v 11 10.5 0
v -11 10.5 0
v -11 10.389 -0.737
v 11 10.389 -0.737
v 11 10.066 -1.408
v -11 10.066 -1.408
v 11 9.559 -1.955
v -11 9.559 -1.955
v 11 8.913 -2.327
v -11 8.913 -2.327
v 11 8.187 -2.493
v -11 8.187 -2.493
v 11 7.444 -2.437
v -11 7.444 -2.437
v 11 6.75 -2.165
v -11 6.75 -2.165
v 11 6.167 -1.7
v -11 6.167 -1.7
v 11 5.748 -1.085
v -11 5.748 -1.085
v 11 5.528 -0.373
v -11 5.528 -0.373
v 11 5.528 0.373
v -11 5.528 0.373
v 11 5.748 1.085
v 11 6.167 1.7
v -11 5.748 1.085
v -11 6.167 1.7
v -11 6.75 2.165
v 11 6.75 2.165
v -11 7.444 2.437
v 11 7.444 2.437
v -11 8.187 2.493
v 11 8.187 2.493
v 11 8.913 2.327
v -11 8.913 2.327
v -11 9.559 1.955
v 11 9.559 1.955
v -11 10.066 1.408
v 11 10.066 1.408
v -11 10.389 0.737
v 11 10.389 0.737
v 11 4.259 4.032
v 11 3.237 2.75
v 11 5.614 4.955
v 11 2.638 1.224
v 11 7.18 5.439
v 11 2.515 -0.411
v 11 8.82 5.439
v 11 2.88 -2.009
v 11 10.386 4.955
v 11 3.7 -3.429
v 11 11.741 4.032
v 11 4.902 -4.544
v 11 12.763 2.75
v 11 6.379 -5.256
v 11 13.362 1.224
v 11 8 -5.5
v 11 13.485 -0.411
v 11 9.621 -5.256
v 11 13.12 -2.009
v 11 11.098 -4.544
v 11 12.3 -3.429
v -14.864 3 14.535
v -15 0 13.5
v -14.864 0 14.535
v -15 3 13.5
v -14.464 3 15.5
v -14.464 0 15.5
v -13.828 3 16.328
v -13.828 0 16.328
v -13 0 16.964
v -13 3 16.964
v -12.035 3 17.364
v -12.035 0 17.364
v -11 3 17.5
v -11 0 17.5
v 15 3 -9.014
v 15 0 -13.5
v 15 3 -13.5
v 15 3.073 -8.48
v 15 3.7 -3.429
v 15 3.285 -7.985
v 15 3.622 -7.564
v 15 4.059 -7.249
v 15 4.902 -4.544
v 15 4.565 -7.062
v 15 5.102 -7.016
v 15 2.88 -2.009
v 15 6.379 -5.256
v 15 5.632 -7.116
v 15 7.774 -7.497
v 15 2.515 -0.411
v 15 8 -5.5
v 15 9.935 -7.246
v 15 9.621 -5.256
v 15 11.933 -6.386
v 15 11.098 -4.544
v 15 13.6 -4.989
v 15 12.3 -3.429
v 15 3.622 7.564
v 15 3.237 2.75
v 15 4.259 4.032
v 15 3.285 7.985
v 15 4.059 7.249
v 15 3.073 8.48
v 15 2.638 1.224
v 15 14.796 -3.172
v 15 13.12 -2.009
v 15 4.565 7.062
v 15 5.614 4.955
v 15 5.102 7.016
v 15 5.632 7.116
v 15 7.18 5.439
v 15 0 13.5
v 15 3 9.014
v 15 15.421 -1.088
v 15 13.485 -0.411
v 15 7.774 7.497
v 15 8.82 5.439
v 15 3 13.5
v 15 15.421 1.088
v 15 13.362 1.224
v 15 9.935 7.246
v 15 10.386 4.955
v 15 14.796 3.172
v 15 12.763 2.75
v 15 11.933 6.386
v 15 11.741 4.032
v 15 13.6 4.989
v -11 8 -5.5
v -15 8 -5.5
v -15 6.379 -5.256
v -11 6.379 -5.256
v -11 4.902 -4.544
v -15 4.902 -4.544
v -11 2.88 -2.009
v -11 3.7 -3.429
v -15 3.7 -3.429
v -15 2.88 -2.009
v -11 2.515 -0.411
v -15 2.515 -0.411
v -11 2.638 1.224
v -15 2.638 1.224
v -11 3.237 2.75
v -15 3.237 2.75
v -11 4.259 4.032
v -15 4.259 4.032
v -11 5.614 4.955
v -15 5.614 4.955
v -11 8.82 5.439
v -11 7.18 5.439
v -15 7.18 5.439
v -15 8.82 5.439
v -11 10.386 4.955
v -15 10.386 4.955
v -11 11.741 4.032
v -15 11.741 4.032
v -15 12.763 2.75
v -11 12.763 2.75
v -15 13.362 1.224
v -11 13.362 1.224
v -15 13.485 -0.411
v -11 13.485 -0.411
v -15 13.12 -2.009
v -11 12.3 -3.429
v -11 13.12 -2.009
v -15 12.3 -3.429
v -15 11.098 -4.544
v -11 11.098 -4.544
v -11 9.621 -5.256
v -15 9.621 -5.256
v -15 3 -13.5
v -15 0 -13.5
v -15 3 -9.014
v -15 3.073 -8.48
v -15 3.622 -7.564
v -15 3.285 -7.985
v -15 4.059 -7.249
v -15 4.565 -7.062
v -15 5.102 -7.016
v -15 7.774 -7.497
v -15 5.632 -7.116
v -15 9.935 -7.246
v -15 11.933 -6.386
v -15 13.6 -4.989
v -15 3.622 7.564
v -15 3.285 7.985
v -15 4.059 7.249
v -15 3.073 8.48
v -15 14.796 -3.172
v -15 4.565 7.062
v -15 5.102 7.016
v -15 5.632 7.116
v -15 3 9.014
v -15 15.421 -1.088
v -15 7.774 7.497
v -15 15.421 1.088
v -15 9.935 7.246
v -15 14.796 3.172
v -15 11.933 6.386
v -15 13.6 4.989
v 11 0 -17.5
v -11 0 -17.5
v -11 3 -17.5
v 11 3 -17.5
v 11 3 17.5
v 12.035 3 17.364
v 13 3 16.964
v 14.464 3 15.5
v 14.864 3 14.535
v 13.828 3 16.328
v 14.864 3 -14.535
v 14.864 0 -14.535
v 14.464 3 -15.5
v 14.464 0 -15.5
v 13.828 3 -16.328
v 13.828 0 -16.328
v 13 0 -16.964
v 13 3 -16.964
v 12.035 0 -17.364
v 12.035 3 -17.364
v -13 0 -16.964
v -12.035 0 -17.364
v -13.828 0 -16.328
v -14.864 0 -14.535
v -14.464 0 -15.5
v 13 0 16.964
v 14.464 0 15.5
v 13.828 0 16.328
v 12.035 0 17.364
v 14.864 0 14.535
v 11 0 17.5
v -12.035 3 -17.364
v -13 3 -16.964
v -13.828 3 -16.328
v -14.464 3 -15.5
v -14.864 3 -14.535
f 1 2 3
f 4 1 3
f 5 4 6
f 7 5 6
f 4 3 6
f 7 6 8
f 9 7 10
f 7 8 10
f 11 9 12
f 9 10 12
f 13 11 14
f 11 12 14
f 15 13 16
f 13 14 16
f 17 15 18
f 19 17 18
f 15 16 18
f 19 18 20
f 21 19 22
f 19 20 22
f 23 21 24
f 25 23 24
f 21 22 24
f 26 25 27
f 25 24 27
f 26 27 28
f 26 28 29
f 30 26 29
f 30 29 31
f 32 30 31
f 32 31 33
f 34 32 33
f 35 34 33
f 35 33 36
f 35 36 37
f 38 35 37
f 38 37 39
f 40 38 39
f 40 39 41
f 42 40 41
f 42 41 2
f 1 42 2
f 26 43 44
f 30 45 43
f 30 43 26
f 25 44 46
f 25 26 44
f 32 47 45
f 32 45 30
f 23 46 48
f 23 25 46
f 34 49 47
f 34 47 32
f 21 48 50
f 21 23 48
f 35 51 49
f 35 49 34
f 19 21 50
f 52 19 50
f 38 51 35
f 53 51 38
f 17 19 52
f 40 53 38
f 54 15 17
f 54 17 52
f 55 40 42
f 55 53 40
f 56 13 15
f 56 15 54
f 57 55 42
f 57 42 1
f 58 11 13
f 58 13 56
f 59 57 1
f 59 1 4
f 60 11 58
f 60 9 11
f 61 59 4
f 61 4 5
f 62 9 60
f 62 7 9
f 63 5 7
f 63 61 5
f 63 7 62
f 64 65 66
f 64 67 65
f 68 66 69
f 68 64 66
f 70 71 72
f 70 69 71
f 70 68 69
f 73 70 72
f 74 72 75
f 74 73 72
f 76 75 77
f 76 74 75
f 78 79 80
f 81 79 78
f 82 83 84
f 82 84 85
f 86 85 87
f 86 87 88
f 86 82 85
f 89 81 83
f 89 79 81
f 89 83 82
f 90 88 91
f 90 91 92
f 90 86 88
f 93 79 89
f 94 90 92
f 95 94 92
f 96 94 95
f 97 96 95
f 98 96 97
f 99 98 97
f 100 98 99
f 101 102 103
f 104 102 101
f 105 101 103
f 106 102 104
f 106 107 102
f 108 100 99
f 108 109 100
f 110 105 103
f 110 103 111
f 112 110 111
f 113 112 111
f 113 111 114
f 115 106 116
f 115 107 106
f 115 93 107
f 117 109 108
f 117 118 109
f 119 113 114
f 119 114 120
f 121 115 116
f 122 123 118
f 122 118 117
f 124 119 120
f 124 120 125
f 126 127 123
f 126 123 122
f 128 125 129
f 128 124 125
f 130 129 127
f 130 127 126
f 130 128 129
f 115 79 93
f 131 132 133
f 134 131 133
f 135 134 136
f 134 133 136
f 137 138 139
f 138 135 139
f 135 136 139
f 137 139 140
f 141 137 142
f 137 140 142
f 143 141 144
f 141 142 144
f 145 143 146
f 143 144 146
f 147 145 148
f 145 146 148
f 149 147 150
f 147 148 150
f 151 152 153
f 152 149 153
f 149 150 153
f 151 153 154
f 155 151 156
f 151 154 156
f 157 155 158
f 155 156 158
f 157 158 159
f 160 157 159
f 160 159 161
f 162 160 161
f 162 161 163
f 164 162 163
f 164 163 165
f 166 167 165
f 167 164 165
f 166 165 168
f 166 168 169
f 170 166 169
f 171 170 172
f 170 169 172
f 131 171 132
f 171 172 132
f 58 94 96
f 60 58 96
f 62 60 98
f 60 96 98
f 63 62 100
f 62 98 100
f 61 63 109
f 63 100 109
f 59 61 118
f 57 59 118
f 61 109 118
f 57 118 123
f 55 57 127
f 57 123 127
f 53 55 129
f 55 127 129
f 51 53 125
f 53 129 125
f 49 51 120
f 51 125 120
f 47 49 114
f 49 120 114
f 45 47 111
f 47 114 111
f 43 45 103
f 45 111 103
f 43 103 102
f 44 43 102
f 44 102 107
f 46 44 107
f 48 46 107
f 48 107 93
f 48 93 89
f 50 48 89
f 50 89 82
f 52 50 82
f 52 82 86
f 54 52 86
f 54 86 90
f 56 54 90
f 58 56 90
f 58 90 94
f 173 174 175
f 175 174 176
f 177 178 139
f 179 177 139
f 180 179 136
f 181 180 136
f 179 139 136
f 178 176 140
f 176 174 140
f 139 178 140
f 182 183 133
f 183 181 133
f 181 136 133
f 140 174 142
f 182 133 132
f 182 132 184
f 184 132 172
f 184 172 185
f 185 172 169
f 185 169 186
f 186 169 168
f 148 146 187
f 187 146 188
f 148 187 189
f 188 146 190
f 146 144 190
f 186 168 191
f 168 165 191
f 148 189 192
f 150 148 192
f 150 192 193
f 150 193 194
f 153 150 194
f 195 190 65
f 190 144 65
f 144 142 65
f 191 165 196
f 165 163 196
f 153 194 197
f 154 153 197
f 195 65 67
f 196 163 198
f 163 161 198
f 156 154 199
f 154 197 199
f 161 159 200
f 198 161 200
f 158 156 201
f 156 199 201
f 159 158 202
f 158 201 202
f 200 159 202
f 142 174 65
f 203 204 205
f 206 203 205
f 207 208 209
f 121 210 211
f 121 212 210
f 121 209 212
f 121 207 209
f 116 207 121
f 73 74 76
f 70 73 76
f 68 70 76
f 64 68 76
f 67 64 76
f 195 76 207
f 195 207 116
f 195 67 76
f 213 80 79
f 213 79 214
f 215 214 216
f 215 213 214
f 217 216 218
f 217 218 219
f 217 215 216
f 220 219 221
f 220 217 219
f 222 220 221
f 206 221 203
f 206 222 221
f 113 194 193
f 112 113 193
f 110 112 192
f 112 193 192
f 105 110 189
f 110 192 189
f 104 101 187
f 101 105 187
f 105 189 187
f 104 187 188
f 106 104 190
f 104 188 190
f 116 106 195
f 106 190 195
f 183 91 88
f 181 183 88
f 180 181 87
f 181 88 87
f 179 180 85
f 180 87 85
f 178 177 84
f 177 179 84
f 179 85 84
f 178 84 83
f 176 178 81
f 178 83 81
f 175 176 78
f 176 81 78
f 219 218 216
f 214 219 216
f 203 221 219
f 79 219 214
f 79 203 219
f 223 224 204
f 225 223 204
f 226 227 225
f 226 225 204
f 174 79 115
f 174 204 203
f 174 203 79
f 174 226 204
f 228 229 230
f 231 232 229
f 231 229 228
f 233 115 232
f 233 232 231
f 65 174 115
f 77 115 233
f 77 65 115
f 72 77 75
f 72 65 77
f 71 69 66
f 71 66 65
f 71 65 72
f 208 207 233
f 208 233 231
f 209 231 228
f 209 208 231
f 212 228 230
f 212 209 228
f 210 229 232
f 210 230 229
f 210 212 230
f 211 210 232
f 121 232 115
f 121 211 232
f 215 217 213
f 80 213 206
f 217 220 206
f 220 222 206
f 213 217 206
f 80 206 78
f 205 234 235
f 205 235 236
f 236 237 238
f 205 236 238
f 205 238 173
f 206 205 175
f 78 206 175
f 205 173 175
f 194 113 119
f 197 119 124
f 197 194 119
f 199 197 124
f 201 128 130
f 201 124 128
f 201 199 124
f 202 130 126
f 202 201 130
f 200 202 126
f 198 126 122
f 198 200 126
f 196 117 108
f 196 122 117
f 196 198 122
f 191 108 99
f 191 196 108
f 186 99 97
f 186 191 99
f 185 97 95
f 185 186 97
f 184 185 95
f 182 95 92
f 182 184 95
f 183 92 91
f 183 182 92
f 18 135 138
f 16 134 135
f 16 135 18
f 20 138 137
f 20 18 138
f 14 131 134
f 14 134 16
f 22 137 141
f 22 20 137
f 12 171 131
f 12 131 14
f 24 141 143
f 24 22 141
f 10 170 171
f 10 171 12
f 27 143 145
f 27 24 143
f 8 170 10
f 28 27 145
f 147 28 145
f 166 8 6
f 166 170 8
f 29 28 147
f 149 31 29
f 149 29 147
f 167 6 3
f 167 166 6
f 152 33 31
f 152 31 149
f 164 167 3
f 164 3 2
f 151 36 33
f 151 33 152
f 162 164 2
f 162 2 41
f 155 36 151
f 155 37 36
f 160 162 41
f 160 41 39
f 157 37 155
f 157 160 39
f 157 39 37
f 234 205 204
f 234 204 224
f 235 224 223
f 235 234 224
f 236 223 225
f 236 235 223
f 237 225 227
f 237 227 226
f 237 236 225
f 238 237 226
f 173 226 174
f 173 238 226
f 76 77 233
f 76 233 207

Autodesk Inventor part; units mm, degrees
ref_plane "YZ Plane" through (0, 0, 0) normal (1, 0, 0) x (0, 1, 0)
ref_plane "XZ Plane" through (0, 0, 0) normal (0, 1, 0) x (-1, 0, 0)
ref_plane "XY Plane" through (0, 0, 0) normal (0, 0, 1) x (1, 0, 0)
sketch "Esboço10" plane through (0, 0, 0) normal (1, 0, 0) x (0, 1, 0)
  line L0 (0, 0) -> (0, 17.5)
  line L1 (0, 0) -> (0, -17.5)
  line L2 (0, 17.5) -> (3, 17.5)
  circle A0 centre (8, 0) radius 2.5
  circle A1 centre (8, 0) radius 7.5
  line L3 (3, 17.5) -> (3, 5.5902)
  line L4 (0, -17.5) -> (3, -17.5)
  line L5 (3, -17.5) -> (3, -5.5902)
  dimension "d67" = 17.5
  dimension "d68" = 17.5
  dimension "d69" = 3
  dimension "d70" = 5
  dimension "d71" = 15
  dimension "d93" = 3
  dimension "d94" = 0
  dimension "d97" = 8
extrude "Extrusão7" add sketch "Esboço10" along normal mid plane 30
fillet "Arredondamento5" radius 2 2 edges at (0, 3, 5.5902) (0, 3, -5.5902)
fillet "Arredondamento6" radius 4 4 edges at (15, 1.5, 17.5) (15, 1.5, -17.5) (-15, 1.5, 17.5) (-15, 1.5, -17.5)
sketch "Esboço15" plane through (15, 0, 0) normal (1, 0, 0) x (0, 0, -1)
  line L0 (13.5, 3) -> (13.5, 0) projected
  line L1 (13.5, 3) -> (9.0139, 3) projected
  arc A0 (7.1162, 5.6316) -> (9.0139, 3) centre (9.0139, 5) ccw projected
  arc A1 (7.1162, 5.6316) -> (-7.1162, 5.6316) centre (0, 8) ccw projected
  arc A2 (-9.0139, 3) -> (-7.1162, 5.6316) centre (-9.0139, 5) ccw projected
  line L2 (-9.0139, 3) -> (-13.5, 3) projected
  line L3 (-13.5, 0) -> (-13.5, 3) projected
  line L4 (-13.5, 0) -> (13.5, 0) projected
  circle A3 centre (0, 8) radius 2.5 projected
  circle A4 centre (0, 8) radius 5.5
  point P0 (0, 0)
  dimension "d98" = 11
extrude "Extrusão11" cut sketch "Esboço15" against normal blind 4 contours A4
mirror "Espelhar1" about plane through (0, 0, 0) normal (1, 0, 0) of "Extrusão11"
equation "\"d68\" = d67"
properties part number "encaixeBase"
